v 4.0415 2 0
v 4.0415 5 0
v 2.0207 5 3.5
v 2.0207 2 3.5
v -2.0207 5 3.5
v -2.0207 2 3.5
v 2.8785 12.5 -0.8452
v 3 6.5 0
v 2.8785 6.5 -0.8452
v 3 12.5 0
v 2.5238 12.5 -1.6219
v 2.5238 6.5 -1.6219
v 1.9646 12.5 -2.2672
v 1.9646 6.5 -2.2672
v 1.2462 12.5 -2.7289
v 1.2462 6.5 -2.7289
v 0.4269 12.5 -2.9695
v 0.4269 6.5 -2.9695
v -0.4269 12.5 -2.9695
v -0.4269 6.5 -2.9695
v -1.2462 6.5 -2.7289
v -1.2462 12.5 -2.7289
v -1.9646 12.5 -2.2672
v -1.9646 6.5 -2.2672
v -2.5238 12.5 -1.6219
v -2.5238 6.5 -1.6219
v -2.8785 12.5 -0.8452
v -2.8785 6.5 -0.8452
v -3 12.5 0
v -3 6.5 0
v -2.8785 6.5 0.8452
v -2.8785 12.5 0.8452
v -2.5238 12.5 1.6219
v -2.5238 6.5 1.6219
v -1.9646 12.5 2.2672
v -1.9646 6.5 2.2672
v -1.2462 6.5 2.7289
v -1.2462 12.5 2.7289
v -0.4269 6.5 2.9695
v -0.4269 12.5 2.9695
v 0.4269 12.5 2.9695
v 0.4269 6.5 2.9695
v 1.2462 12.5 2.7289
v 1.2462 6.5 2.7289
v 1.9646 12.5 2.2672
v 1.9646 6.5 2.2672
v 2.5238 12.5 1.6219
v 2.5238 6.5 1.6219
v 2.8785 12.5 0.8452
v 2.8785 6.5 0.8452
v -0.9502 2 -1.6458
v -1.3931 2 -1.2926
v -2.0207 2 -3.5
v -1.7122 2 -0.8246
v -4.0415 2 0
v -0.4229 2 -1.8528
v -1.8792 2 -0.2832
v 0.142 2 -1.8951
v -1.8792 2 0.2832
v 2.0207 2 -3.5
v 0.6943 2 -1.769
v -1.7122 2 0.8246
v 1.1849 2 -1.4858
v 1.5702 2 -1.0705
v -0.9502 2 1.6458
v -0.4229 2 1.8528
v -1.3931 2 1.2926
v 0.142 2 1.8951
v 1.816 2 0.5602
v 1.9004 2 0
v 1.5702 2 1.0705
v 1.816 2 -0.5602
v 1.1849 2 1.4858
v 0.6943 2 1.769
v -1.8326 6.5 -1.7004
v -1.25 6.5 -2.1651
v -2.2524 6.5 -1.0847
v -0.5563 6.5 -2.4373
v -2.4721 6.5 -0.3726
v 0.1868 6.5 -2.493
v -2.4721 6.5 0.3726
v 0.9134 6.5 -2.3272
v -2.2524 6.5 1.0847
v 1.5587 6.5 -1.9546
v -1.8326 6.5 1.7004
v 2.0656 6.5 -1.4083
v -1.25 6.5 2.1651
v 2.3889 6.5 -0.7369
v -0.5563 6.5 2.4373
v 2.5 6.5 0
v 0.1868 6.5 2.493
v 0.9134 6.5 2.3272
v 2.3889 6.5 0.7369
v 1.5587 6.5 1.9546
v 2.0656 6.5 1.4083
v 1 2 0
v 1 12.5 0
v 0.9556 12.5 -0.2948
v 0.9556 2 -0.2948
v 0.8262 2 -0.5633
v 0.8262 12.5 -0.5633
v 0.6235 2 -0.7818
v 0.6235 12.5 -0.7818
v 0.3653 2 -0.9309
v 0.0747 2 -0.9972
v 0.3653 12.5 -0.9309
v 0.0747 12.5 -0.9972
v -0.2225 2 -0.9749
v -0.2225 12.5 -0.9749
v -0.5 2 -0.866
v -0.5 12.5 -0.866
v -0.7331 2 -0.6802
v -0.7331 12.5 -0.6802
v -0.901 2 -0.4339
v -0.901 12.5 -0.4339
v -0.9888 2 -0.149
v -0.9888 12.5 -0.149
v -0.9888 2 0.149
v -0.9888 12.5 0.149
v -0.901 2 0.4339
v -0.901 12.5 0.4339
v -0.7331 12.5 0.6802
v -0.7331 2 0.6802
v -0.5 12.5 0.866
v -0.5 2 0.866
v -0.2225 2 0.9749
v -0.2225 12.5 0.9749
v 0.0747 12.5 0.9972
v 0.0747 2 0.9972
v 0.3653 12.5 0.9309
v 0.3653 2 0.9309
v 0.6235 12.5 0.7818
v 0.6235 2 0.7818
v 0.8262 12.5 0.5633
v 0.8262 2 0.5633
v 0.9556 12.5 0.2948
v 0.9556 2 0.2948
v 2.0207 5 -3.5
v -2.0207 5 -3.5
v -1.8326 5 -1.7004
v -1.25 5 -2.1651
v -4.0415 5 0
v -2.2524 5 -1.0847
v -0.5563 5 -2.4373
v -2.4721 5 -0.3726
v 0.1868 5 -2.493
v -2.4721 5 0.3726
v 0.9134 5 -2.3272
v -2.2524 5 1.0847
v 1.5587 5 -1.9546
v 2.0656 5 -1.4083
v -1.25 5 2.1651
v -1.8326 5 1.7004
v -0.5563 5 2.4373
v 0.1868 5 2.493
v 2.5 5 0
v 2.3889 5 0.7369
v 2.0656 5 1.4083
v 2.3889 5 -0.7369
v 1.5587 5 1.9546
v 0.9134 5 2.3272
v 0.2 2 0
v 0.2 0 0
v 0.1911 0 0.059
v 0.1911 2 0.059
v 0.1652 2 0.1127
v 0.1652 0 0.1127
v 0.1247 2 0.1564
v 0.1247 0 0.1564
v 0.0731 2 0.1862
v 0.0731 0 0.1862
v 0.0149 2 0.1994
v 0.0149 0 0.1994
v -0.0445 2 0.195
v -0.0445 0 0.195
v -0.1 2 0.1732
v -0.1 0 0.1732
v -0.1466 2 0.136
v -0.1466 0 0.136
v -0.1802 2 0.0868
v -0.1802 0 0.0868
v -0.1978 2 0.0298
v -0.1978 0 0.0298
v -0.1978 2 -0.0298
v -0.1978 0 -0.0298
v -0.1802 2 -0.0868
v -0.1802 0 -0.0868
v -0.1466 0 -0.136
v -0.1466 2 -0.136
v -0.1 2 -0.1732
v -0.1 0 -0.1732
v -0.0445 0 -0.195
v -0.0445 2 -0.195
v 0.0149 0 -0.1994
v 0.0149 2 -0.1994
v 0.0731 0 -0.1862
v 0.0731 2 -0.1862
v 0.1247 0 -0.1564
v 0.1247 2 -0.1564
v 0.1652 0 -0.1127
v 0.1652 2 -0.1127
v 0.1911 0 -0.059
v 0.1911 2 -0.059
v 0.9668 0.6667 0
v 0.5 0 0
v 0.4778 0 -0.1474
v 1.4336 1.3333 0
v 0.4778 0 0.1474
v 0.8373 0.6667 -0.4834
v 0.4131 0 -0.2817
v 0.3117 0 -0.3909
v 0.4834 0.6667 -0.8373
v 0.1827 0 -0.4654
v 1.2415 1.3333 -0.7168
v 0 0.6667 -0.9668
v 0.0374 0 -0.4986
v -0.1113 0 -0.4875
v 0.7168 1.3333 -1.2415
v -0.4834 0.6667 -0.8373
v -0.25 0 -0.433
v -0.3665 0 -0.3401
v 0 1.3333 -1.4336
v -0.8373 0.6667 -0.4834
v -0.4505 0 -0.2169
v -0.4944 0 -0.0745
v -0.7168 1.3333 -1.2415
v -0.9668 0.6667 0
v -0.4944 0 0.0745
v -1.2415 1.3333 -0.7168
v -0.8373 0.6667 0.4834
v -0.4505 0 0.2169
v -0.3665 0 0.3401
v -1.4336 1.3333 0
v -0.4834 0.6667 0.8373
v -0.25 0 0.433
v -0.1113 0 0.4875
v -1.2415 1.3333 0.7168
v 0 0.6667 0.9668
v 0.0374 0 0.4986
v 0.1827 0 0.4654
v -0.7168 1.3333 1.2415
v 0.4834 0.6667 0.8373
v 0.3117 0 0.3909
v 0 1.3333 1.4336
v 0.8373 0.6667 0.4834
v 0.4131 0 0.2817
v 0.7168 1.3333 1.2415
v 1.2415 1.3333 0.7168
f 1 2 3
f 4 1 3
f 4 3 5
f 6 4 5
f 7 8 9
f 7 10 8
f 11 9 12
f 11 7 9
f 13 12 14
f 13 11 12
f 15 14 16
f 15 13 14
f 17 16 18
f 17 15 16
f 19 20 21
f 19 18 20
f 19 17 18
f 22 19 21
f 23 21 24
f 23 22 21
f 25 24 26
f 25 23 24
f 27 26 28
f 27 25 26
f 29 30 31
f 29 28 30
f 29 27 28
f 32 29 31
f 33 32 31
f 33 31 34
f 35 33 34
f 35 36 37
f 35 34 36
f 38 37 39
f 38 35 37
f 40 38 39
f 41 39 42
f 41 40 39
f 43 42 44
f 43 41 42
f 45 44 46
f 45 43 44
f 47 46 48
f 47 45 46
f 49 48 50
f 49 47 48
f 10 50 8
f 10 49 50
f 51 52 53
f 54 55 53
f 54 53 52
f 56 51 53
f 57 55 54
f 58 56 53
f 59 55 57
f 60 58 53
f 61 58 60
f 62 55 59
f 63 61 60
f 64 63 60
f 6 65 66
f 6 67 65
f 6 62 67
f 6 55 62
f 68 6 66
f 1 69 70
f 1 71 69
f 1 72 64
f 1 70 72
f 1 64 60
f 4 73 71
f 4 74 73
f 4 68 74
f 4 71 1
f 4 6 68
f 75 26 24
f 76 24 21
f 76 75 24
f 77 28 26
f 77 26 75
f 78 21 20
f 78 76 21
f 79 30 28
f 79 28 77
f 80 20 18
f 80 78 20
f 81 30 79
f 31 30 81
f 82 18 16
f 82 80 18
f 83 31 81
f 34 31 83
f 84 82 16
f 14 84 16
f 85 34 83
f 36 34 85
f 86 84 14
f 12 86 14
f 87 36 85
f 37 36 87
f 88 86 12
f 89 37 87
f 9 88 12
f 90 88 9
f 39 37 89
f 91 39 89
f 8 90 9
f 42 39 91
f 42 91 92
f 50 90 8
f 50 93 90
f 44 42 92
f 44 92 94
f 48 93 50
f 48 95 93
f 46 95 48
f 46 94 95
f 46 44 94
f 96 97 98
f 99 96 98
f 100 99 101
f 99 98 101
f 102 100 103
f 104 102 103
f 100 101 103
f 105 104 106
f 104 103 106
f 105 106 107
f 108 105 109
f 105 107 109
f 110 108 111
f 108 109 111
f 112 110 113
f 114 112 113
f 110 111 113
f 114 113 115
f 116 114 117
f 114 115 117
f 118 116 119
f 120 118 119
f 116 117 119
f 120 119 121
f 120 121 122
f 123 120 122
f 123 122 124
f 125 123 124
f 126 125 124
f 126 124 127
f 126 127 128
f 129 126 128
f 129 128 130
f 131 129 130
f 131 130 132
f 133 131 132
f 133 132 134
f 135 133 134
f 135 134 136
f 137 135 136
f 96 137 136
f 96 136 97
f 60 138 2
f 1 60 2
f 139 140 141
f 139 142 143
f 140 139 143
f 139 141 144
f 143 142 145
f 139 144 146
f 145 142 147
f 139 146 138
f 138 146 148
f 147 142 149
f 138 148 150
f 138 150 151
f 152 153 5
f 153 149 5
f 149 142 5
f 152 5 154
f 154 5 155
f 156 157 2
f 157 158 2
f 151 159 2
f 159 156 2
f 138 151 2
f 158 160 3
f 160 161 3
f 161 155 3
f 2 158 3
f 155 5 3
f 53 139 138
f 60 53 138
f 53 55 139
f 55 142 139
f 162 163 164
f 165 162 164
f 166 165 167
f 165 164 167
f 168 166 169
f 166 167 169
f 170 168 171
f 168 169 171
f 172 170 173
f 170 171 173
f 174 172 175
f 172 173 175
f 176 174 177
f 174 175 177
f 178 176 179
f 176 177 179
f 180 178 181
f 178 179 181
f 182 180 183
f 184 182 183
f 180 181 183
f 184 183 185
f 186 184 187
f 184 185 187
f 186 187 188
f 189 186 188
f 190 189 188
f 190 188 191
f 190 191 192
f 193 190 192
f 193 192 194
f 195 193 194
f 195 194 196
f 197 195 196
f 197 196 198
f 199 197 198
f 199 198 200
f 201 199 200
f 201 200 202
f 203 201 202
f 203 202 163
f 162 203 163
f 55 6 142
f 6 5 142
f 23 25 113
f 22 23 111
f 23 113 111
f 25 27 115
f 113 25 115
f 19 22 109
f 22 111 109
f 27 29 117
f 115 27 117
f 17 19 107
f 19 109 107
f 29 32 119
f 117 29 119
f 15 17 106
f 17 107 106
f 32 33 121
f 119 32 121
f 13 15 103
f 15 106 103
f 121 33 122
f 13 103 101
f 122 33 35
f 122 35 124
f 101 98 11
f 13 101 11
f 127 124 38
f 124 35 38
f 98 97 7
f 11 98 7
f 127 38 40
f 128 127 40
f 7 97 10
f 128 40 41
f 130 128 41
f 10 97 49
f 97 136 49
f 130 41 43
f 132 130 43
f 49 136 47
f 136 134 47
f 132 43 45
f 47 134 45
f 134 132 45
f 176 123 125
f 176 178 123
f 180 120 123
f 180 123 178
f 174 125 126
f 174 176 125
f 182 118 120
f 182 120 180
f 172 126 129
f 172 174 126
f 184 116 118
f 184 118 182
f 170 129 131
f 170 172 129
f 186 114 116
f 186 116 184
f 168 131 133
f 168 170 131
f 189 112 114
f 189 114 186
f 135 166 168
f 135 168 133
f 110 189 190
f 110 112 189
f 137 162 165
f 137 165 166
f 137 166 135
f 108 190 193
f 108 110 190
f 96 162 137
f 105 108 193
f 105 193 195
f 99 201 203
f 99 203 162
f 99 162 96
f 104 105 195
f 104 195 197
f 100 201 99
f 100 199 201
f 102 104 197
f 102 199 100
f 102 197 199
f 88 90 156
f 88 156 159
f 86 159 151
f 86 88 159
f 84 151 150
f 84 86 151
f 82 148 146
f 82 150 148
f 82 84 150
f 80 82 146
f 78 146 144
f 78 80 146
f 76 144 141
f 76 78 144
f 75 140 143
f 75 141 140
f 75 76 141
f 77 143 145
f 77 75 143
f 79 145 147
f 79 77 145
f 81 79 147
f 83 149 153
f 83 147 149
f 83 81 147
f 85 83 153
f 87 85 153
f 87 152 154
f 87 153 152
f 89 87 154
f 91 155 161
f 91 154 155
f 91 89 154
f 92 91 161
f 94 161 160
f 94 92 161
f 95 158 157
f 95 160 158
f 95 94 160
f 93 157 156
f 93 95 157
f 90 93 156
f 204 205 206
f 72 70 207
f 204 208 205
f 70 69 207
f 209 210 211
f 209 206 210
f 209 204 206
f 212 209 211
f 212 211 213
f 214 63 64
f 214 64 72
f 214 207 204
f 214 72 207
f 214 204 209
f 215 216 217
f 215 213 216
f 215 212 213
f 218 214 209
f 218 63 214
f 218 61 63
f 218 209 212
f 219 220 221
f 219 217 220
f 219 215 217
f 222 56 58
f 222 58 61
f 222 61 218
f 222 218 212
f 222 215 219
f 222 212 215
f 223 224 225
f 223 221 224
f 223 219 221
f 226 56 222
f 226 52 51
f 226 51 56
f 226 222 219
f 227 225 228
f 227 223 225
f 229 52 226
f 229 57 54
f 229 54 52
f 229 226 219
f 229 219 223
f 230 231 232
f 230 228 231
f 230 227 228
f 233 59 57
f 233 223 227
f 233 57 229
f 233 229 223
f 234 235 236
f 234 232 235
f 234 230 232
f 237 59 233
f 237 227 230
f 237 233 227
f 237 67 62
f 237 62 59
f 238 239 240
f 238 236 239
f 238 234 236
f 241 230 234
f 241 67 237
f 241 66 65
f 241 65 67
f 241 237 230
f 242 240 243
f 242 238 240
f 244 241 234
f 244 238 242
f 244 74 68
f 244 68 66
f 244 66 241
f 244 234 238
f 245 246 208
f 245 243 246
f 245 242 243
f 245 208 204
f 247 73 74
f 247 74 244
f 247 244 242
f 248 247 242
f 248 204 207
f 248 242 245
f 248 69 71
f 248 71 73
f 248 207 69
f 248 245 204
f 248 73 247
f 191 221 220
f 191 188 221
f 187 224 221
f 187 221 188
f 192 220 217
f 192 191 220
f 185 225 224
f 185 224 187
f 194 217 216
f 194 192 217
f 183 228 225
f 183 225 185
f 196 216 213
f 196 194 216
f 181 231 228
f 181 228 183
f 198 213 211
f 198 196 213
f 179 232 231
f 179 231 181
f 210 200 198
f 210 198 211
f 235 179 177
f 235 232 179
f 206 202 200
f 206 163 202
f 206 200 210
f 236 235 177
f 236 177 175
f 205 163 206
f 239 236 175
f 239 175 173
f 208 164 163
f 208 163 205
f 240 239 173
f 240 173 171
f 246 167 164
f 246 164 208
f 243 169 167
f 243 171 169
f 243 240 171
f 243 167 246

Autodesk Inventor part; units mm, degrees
ref_plane "YZ Plane" through (0, 0, 0) normal (1, 0, 0) x (0, 1, 0)
ref_plane "XZ Plane" through (0, 0, 0) normal (0, 1, 0) x (-1, 0, 0)
ref_plane "XY Plane" through (0, 0, 0) normal (0, 0, 1) x (1, 0, 0)
sketch "Sketch1" plane through (0, 0, 0) normal (0, 0, 1) x (1, 0, 0)
  line L0 (0, 0) -> (0.5, 0)
  line L1 (0.5, 0) -> (1.9004, 2)
  line L2 (1.9004, 2) -> (4.5, 2)
  line L3 (4.5, 2) -> (4.5, 5)
  line L4 (4.5, 5) -> (2.5, 5)
  line L5 (2.5, 5) -> (2.5, 6.5)
  line L6 (2.5, 6.5) -> (3, 6.5)
  line L7 (3, 6.5) -> (3, 12.5)
  line L8 (3, 12.5) -> (0, 12.5)
  line L9 (0, 12.5) -> (0, 0)
  dimension "d0" = 0.5
  dimension "d1" = 125
  dimension "d3" = 4.5
  dimension "d4" = 3
  dimension "d5" = 2.5
  dimension "d6" = 1.5
  dimension "d7" = 3
  dimension "d8" = 10.5
  dimension "d9" = 12.5
revolve "Revolution1" add sketch "Sketch1" angle 360 about axis through (0, 12.5, 0) along (0, -1, 0)
sketch "Sketch2" plane through (0, 5, 0) normal (0, 1, 0) x (1, 0, 0)
  circle A0 centre (0, 0) radius 4.5 projected
  line L0 (4.0415, 0) -> (2.0207, -3.5)
  line L1 (2.0207, -3.5) -> (-2.0207, -3.5)
  line L2 (-2.0207, -3.5) -> (-4.0415, 0)
  line L3 (-4.0415, 0) -> (-2.0207, 3.5)
  line L4 (-2.0207, 3.5) -> (2.0207, 3.5)
  line L5 (2.0207, 3.5) -> (4.0415, 0)
  dimension "d11" = 7
extrude "Extrusion1" cut sketch "Sketch2" against normal up to surface (3 mm away)
thread "Thread1" size "M6x1" class "6g" standard "ANSI Metric M Profile" full length
sketch "Sketch3" plane through (0, 12.5, 0) normal (0, 1, 0) x (1, 0, 0)
  circle A0 centre (0, 0) radius 3 projected
  circle A1 centre (0, 0) radius 1
  dimension "d16" = 2
extrude "Extrusion2" cut sketch "Sketch3" against normal blind 10.5 contours A1
sketch "Sketch4" plane through (0, 0, 0) normal (0, -1, 0) x (1, 0, 0)
  circle A0 centre (0, 0) radius 0.5 projected
  circle A1 centre (0, 0) radius 0.2
  dimension "d19" = 0.4
extrude "Extrusion3" cut sketch "Sketch4" against normal up to surface (2 mm away) contours A1
properties part number "ChimeraNozzle.4" material "Brass, Soft Yellow"
